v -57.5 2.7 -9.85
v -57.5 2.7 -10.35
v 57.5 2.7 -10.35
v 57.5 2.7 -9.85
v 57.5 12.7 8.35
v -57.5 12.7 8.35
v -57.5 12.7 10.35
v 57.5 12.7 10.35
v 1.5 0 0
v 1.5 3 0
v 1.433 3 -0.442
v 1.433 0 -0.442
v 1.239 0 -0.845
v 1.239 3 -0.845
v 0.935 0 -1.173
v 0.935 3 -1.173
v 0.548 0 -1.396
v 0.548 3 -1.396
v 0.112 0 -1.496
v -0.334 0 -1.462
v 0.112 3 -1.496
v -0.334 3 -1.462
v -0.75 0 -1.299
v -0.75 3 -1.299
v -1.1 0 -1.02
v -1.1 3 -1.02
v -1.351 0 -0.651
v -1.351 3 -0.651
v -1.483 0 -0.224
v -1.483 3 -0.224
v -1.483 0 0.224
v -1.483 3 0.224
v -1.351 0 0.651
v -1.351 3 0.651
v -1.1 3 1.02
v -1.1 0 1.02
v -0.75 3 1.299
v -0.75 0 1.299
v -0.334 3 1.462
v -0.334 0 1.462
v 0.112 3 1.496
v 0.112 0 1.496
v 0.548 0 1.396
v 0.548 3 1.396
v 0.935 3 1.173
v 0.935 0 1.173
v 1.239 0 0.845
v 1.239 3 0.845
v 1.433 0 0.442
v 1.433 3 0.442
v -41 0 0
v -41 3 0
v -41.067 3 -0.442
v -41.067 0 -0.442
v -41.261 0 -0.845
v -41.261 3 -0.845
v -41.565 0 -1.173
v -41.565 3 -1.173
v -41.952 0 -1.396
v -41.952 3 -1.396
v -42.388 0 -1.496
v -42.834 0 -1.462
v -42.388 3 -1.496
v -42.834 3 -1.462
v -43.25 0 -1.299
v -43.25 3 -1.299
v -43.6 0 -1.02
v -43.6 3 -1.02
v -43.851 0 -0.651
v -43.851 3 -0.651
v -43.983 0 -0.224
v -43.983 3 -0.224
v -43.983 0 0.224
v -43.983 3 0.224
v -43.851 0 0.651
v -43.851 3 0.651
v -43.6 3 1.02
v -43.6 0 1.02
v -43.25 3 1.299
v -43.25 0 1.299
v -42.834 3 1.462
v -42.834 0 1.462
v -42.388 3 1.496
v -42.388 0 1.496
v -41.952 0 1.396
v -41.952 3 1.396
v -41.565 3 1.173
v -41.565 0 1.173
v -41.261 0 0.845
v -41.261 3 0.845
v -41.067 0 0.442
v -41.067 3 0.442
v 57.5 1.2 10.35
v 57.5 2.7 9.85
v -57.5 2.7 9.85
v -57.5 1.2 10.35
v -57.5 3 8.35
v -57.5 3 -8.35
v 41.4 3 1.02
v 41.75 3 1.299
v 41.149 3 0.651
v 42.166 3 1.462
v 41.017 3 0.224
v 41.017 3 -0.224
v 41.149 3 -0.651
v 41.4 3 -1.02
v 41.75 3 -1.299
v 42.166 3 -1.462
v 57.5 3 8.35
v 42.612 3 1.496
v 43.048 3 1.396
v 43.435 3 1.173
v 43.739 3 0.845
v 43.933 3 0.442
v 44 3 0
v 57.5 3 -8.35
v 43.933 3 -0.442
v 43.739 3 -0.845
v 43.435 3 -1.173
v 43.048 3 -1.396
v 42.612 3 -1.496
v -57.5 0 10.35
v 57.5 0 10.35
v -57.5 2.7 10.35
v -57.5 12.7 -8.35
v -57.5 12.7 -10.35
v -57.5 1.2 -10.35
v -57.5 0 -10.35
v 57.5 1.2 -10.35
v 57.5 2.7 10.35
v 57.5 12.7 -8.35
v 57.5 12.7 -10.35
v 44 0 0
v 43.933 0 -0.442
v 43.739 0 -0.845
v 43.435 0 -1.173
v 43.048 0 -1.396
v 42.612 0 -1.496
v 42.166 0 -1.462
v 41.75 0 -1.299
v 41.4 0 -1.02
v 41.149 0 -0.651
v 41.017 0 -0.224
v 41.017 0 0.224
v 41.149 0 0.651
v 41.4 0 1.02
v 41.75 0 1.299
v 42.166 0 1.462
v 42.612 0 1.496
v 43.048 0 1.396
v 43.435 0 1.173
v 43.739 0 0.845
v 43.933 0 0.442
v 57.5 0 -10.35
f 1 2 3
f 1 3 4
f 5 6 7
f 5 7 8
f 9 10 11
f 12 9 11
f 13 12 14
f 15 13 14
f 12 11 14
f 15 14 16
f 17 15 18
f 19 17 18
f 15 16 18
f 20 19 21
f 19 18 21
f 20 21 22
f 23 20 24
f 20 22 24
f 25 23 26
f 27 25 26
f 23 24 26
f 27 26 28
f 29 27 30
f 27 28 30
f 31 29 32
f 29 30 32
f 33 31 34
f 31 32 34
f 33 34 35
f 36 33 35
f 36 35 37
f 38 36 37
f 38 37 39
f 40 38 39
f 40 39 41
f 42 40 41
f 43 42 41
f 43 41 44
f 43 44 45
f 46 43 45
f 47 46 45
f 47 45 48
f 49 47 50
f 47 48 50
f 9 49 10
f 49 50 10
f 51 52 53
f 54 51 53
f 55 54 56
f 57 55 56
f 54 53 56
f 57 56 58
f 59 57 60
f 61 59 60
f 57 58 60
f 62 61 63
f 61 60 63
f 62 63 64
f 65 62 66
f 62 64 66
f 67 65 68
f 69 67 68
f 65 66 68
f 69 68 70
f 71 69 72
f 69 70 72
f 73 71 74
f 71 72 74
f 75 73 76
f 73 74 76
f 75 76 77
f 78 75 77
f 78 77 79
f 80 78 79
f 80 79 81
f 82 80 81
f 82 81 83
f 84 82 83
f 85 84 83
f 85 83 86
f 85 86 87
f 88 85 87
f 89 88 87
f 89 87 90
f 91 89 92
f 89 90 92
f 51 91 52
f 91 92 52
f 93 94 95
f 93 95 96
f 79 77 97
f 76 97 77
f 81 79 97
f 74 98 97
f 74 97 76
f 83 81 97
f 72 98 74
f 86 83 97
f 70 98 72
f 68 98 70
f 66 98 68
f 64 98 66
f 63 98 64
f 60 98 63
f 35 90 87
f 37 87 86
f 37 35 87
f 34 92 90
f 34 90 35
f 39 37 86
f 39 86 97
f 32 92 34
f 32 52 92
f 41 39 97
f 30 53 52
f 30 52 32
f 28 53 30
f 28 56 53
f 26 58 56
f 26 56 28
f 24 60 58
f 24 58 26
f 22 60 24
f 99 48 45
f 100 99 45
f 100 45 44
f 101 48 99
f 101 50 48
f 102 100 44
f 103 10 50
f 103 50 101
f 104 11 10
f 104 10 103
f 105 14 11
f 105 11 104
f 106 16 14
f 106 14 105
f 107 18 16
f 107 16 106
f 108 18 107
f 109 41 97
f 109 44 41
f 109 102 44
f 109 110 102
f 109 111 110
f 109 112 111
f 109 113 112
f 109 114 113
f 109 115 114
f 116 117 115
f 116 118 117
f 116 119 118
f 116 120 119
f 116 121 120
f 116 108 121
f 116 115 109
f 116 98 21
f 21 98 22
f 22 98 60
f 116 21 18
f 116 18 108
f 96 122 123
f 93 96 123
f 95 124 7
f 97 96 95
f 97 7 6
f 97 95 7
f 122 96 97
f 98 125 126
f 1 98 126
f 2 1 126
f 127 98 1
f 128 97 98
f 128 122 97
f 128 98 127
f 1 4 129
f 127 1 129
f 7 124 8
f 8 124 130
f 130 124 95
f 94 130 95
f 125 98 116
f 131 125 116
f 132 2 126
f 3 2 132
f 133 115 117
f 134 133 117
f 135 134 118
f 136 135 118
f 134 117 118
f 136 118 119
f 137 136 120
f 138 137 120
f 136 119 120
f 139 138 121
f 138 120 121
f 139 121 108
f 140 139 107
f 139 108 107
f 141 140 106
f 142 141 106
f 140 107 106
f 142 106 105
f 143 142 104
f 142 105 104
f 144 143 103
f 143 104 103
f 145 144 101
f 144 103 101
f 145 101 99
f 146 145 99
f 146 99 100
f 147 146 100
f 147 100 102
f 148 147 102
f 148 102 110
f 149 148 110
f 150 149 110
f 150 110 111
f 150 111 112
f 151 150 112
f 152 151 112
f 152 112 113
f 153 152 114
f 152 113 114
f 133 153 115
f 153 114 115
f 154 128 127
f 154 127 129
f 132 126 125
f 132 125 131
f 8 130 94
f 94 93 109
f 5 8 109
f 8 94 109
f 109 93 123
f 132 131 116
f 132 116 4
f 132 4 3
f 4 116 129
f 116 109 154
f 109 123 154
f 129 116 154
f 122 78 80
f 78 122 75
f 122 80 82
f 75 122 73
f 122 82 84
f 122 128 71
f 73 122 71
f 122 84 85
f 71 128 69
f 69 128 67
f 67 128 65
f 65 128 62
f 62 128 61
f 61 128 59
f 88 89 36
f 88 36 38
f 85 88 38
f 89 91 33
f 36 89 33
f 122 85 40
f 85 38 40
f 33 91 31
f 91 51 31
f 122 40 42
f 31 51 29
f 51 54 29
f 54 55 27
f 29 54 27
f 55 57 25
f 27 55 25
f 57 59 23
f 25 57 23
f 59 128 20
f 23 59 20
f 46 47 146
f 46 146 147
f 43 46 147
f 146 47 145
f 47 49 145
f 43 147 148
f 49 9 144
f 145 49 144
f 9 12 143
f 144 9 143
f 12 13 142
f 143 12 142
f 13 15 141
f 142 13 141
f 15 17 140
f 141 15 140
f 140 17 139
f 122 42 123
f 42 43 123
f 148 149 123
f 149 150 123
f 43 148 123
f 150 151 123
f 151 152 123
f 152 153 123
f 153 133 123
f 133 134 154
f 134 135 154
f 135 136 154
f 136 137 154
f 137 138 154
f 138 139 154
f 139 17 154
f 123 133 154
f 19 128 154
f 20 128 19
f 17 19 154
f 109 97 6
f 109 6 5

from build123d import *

# Parameters (mm, degrees)
CROQUIS1_W              = 115
CROQUIS1_H              = 20.7
SALIENTE_EXTRUIR2_DEPTH = 3
CROQUIS6_R              = 1.5
CORTAR_EXTRUIR4_DEPTH   = 3
CROQUIS7_W              = 115
CROQUIS7_H              = 2
SALIENTE_EXTRUIR3_DEPTH = 9.7
CORTAR_EXTRUIR5_DEPTH   = 224


with BuildPart() as part:
    # Croquis1 → Saliente-Extruir2 (new body)
    with BuildSketch(Plane(origin=(0, 0, 0), x_dir=(1, 0, 0), z_dir=(0, 1, 0))):
        Rectangle(CROQUIS1_W, CROQUIS1_H)
    extrude(amount=SALIENTE_EXTRUIR2_DEPTH)

    # Croquis6 → Cortar-Extruir4 (cut)
    with BuildSketch(Plane(origin=(0, 3, 0), x_dir=(1, 0, 0), z_dir=(0, 1, 0))):
        with Locations((-42.5, 0)):
            Circle(CROQUIS6_R)
        Circle(CROQUIS6_R)
        with Locations((42.5, 0)):
            Circle(CROQUIS6_R)
    extrude(amount=-CORTAR_EXTRUIR4_DEPTH, mode=Mode.SUBTRACT)

    # Croquis7 → Saliente-Extruir3 (add)
    with BuildSketch(Plane(origin=(0, 3, 0), x_dir=(1, 0, 0), z_dir=(0, 1, 0))):
        with Locations((0, 9.35)):
            Rectangle(CROQUIS7_W, CROQUIS7_H)
        with Locations((0, -9.35)):
            Rectangle(CROQUIS7_W, CROQUIS7_H)
    extrude(amount=SALIENTE_EXTRUIR3_DEPTH)

    # Croquis9 → Cortar-Extruir5 (cut)
    with BuildSketch(Plane.ZY.offset(57.5)):
        Polygon((-10.35, 2.7), (-9.85, 2.7), (-10.35, 1.2), align=None)
        Polygon((10.35, 2.7), (9.85, 2.7), (10.35, 1.2), align=None)
    extrude(amount=-CORTAR_EXTRUIR5_DEPTH, mode=Mode.SUBTRACT)


solid = part.part
